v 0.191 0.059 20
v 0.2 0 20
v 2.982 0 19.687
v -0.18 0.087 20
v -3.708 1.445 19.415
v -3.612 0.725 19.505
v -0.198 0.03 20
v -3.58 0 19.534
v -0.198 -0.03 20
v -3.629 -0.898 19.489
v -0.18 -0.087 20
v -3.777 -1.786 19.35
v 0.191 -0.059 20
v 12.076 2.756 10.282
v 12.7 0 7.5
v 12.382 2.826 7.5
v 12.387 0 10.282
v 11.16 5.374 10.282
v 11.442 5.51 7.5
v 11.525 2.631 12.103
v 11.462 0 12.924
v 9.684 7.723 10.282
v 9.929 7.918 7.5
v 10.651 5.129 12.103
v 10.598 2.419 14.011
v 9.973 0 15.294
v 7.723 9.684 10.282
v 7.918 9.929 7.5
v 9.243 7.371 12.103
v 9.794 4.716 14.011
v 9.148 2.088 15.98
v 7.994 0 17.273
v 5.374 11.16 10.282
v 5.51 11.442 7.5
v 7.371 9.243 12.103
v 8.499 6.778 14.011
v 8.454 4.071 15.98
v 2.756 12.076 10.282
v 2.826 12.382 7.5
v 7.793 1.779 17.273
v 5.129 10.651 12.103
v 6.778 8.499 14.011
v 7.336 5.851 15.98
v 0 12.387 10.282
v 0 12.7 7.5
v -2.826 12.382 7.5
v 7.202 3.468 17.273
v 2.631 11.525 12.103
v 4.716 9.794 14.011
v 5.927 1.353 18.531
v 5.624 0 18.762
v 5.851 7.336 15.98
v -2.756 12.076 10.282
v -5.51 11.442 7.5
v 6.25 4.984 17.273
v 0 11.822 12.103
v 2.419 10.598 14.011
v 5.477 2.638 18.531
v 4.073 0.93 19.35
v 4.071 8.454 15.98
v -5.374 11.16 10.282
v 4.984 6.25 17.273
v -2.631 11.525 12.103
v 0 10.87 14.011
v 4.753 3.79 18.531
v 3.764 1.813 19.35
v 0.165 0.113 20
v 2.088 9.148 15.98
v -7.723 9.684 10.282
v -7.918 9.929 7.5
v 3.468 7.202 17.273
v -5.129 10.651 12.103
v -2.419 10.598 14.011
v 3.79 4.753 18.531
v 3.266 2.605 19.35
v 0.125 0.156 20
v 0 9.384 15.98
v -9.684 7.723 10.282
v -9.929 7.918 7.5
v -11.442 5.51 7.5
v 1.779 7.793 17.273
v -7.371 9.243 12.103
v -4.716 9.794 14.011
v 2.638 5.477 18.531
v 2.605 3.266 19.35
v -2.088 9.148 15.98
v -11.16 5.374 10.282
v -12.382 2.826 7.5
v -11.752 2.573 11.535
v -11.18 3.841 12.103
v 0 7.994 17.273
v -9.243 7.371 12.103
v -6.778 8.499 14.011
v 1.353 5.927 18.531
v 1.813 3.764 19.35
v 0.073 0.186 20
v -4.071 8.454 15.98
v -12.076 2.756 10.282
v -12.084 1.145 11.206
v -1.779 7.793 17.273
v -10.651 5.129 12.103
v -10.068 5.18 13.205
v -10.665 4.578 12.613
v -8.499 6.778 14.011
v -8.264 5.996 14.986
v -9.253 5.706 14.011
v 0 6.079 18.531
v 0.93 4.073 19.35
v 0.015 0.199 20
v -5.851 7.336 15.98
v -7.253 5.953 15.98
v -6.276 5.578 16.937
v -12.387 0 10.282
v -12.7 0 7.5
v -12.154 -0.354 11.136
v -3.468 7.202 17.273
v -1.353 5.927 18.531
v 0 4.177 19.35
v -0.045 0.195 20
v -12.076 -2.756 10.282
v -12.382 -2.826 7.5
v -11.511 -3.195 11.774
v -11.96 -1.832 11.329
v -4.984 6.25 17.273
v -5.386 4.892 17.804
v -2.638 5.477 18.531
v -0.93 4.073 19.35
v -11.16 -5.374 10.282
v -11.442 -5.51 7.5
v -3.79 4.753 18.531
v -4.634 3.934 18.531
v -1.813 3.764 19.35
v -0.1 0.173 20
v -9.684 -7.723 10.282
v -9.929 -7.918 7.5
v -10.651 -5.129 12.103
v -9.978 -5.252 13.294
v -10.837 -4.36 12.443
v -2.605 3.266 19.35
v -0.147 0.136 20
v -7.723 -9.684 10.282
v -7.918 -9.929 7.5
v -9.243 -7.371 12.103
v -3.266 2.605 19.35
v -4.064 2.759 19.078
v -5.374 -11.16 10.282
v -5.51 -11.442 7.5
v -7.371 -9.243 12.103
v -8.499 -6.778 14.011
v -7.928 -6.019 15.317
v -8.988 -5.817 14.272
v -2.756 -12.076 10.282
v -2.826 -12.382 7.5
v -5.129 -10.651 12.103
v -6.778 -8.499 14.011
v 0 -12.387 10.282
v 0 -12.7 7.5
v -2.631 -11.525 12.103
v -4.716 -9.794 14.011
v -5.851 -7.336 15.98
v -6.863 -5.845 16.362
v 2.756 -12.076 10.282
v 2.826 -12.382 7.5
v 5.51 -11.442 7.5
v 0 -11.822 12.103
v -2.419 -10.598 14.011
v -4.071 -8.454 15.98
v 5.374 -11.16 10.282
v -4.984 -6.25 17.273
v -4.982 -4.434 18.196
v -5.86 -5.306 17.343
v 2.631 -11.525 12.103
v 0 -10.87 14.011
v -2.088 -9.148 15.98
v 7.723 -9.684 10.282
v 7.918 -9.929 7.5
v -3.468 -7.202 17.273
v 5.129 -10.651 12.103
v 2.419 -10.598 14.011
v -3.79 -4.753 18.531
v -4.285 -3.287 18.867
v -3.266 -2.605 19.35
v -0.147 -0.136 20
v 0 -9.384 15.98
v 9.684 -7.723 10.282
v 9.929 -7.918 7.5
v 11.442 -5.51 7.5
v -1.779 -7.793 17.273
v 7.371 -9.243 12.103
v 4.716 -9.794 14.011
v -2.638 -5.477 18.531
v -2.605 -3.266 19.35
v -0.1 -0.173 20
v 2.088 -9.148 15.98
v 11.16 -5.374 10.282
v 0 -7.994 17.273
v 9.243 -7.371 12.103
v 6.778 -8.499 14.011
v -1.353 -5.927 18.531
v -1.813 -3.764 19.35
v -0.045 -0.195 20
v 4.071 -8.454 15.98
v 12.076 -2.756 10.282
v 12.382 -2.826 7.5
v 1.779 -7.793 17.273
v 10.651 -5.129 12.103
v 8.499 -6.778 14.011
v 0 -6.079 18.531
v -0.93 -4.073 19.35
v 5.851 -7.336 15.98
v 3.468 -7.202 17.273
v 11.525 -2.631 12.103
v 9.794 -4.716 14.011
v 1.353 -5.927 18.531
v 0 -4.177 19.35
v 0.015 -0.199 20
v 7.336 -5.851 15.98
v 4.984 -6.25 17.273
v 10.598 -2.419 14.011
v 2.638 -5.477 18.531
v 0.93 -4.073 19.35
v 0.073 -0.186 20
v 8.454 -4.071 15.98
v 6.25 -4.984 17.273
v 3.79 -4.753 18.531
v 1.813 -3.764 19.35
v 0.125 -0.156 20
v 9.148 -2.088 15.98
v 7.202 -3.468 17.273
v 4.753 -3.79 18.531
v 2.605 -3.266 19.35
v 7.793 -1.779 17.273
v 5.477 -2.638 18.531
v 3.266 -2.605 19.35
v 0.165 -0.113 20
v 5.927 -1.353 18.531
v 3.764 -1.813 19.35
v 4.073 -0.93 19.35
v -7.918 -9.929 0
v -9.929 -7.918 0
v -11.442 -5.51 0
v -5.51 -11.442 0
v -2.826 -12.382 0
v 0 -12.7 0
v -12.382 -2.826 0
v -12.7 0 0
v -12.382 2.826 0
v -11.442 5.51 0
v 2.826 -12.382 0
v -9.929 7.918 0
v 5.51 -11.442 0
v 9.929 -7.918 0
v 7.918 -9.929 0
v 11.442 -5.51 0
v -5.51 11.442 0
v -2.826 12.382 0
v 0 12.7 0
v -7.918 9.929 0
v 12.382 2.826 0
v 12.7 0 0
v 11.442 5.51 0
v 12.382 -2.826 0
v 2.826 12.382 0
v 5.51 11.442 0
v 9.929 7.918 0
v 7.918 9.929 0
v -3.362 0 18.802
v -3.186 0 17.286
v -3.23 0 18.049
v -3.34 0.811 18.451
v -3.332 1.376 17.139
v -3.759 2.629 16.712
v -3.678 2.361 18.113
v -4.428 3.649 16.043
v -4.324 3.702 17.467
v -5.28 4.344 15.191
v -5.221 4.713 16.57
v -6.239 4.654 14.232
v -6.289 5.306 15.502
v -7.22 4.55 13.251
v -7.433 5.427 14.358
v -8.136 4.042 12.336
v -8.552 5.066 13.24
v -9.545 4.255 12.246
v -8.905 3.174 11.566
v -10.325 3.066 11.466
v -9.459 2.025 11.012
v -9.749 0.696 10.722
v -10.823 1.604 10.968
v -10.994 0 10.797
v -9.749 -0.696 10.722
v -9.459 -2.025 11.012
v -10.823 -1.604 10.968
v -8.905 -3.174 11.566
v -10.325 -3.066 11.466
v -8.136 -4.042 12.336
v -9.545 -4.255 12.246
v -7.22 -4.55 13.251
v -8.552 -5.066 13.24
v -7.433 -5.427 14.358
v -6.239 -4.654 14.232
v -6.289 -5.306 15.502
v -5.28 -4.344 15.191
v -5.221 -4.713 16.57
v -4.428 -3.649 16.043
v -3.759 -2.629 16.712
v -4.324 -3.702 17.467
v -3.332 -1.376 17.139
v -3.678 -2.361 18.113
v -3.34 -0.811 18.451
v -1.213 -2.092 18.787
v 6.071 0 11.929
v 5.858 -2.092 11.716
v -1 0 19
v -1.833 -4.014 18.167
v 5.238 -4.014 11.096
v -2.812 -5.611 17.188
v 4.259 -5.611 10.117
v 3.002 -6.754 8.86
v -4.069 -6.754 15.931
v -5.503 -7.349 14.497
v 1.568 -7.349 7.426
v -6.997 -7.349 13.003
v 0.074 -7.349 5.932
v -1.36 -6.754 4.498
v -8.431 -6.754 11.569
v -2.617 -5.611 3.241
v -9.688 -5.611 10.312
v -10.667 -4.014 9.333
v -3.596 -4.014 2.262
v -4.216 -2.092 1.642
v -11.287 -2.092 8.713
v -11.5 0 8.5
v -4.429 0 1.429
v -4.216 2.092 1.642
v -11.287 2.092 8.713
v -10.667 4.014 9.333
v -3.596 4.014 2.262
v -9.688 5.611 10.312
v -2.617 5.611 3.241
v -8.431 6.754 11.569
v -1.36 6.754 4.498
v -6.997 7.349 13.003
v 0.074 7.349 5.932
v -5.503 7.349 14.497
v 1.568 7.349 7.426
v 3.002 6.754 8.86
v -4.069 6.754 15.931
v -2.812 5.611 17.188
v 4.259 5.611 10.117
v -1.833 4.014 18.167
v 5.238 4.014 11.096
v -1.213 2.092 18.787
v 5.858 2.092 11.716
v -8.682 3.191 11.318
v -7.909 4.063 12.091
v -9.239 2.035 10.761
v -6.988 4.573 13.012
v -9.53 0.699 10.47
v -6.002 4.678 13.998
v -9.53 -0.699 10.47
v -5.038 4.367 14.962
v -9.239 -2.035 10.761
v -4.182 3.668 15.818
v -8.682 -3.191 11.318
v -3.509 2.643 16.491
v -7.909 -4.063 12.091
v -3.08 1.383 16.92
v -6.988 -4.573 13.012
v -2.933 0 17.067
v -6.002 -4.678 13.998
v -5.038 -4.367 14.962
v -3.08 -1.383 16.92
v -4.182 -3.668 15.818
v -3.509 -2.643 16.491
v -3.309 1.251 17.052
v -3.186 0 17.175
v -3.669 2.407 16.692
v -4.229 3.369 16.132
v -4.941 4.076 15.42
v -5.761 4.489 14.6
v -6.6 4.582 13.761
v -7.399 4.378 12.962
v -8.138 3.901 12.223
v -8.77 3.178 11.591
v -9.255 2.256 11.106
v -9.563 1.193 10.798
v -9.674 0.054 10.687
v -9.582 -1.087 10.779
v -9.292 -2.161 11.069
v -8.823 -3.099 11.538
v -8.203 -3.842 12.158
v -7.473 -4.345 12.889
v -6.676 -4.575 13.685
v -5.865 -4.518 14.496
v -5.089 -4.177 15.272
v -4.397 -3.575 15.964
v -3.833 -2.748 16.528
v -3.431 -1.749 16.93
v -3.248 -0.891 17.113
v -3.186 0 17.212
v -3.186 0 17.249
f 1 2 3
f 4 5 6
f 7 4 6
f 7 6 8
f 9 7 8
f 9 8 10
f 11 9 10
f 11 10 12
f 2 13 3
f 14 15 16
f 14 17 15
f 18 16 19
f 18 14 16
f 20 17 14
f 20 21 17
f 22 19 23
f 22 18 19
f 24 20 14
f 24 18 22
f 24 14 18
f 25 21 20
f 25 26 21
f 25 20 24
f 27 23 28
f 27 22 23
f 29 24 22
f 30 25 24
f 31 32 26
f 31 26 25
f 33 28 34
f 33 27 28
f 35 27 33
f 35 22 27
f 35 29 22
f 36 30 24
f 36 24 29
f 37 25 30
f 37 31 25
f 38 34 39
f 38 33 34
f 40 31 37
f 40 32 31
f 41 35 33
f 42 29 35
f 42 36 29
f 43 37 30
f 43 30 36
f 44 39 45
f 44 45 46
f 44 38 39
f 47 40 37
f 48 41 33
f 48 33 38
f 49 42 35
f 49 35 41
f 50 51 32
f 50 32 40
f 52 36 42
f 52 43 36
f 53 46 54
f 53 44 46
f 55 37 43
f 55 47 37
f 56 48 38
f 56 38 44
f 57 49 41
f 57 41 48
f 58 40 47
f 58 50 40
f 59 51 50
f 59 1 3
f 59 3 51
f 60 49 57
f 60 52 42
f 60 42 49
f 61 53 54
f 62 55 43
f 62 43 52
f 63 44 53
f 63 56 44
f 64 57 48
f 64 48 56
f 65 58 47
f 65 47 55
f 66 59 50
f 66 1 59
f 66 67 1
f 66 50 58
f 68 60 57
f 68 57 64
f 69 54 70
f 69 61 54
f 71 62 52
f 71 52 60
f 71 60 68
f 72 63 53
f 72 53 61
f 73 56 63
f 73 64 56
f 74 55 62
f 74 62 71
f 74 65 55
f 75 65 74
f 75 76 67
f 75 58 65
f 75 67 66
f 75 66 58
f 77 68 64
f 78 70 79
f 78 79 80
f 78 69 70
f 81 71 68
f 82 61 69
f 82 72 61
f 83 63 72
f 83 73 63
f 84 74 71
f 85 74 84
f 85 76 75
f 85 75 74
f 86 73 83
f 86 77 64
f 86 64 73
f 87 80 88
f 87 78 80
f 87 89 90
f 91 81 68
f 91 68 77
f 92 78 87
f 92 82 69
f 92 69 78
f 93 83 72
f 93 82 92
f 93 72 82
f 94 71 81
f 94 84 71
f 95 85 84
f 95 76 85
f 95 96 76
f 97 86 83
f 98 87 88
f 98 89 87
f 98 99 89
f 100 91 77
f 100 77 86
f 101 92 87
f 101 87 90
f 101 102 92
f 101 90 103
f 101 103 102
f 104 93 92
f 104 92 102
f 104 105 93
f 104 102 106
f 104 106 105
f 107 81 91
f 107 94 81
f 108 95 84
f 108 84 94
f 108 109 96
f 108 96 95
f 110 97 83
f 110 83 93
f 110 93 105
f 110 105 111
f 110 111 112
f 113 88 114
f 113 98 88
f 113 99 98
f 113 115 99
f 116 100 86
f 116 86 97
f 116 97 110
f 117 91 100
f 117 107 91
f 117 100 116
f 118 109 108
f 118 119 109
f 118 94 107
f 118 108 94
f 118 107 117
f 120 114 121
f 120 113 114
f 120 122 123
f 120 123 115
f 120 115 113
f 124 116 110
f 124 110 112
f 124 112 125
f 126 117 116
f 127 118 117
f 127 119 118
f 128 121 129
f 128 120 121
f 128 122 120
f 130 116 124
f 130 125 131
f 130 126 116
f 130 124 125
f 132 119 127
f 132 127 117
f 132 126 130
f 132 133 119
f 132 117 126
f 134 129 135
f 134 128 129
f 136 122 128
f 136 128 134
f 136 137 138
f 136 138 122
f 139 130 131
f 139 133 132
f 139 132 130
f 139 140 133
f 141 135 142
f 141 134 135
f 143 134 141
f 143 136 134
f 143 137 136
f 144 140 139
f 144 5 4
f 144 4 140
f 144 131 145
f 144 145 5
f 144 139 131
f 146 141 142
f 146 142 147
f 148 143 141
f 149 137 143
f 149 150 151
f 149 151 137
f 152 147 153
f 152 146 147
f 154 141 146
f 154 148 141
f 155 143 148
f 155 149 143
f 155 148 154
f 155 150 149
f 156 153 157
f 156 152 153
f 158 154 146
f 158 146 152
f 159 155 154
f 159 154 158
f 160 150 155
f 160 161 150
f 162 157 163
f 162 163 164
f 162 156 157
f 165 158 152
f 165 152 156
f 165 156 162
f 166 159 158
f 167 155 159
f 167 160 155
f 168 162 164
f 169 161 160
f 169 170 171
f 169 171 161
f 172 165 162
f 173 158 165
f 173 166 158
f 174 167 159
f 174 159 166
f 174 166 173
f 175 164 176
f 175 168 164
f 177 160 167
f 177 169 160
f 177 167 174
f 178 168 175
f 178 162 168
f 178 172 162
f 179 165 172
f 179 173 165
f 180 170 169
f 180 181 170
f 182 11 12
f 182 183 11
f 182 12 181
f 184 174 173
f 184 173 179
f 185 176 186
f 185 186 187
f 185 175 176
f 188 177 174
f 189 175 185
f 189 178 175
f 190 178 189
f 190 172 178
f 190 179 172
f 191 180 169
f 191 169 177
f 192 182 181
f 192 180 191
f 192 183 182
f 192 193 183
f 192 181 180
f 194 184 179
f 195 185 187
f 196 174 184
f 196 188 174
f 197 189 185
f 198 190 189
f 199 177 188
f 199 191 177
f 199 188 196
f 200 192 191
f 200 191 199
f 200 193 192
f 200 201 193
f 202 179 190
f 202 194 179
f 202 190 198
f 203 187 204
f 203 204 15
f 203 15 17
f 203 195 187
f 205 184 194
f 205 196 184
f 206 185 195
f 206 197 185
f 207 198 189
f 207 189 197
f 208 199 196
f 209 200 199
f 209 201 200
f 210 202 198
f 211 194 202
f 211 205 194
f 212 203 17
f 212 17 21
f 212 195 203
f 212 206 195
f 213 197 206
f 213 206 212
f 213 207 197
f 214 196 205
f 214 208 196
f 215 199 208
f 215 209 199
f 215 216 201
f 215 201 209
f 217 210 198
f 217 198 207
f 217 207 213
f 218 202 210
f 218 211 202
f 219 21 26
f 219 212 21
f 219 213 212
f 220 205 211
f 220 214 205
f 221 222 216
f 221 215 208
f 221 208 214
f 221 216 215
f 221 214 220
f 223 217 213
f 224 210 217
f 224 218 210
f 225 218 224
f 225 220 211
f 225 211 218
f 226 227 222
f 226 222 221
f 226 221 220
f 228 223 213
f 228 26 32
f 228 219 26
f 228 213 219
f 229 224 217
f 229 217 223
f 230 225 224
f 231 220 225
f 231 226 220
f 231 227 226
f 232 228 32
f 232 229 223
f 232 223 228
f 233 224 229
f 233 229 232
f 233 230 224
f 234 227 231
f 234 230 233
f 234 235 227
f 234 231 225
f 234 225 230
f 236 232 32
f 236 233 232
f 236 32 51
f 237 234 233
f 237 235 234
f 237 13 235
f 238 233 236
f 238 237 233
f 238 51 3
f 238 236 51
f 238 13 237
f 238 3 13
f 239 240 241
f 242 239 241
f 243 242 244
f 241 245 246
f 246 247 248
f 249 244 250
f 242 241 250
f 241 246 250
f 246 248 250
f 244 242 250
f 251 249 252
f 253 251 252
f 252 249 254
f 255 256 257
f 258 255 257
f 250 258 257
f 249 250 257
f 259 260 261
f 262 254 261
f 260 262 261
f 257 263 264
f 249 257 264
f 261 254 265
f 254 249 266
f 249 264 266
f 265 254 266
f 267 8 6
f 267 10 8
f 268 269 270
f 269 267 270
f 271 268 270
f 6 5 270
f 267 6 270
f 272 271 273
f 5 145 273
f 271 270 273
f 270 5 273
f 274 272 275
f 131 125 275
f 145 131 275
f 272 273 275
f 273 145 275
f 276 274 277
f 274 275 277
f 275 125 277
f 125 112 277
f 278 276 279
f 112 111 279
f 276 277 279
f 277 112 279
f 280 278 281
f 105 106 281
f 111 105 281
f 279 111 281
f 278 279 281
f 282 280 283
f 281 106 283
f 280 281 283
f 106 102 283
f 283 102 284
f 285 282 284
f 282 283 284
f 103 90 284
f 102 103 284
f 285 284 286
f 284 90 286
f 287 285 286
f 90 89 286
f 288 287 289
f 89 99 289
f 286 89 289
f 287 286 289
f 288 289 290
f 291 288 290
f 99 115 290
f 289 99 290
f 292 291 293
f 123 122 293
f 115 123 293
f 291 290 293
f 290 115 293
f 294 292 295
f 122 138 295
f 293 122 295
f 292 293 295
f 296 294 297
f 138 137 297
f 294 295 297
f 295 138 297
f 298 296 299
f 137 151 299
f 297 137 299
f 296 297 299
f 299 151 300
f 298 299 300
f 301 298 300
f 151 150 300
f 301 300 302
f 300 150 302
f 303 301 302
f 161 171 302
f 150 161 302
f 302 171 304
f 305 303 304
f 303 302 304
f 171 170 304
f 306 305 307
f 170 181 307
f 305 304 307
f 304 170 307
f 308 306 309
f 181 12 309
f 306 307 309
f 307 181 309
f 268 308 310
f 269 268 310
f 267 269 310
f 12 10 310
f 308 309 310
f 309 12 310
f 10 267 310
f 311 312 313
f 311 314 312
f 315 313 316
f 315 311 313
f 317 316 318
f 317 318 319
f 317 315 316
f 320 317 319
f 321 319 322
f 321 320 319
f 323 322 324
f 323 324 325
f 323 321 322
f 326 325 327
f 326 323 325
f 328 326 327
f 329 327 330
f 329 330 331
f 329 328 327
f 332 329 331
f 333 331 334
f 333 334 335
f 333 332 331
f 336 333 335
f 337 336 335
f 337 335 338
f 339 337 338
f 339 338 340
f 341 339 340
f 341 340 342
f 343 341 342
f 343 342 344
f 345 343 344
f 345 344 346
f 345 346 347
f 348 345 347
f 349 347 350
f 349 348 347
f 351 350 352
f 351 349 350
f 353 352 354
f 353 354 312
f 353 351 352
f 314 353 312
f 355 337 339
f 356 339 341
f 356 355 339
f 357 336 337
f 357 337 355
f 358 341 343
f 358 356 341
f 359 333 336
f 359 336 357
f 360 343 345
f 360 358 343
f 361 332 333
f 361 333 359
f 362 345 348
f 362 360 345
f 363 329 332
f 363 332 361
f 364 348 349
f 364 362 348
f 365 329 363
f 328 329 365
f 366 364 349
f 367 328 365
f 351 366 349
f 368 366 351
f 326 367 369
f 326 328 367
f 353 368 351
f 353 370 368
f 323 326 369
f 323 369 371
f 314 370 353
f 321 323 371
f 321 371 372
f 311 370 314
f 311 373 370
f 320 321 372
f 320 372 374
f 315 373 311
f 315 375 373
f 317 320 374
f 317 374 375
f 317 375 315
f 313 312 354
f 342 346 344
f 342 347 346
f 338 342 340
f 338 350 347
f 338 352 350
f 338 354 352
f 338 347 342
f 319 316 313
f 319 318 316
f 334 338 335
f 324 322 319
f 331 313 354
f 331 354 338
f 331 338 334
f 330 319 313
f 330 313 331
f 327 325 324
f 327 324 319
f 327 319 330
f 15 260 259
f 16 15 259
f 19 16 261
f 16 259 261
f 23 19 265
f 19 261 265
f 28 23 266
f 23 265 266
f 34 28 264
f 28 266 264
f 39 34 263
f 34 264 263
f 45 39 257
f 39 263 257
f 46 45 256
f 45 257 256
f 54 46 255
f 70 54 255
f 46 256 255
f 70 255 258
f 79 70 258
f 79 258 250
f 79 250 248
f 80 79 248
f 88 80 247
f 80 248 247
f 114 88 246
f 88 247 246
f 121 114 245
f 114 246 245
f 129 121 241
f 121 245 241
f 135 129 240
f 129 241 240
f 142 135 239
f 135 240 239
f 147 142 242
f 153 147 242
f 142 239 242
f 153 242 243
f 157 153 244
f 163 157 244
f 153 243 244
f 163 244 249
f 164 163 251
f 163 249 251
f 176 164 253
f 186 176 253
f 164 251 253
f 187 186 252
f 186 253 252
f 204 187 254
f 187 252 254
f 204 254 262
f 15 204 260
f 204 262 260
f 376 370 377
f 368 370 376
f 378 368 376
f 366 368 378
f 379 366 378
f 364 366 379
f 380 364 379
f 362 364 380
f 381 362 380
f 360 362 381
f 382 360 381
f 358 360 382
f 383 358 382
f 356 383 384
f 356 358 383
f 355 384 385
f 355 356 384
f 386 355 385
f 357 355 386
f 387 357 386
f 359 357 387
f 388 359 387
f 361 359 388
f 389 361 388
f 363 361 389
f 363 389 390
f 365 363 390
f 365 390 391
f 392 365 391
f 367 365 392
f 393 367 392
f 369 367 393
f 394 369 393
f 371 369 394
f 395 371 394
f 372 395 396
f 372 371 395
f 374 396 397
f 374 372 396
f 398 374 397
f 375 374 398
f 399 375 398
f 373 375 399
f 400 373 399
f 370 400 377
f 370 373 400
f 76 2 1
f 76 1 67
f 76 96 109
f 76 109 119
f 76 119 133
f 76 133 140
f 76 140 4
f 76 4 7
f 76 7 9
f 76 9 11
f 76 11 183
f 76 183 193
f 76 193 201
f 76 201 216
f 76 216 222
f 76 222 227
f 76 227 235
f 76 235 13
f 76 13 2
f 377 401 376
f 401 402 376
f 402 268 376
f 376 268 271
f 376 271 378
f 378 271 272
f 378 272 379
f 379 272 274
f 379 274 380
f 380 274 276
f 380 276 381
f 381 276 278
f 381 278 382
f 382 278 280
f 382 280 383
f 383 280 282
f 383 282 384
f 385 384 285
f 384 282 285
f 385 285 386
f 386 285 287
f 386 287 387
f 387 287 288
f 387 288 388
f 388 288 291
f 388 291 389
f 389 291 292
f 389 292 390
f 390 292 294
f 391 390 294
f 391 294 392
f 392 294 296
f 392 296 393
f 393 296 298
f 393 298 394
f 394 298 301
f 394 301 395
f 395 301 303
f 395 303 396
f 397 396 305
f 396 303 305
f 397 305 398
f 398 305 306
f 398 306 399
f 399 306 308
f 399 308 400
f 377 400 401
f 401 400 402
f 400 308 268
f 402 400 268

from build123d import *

# Parameters (mm, degrees)
F0_R     = 12.7
F1_DEPTH = 20
F2_R     = 12.5


# Not quite as in the source:
# - a fillet or chamfer that OpenCascade refuses, or shapes differently, is made with other operations: its cross-section is extruded or revolved along the edge and cut away or added


with BuildPart() as f1:
    # F0 (on Top) → F1 (new body)
    with BuildSketch(Plane.XY):
        Circle(F0_R)
    extrude(amount=F1_DEPTH)

    # F2
    f2_edges = [f1.edges().sort_by_distance(p)[0] for p in [
        (-12.7, 0, 20),
    ]]
    fillet(f2_edges, radius=F2_R)

    # F3 (on Front) → F4 (revolve, cut)
    with BuildSketch(Plane.XZ):
        Polygon((6.0710678119, 11.9289321881), (-1, 19), (-6.25, 13.75), (0.8210678119, 6.6789321881), align=None)
    revolve(axis=Axis((-2.7144660941, 0, 10.2144660941), (0.7071067812, 0, -0.7071067812)), mode=Mode.SUBTRACT)

    # F5 (on Front) → F6 (revolve, cut)
    with BuildSketch(Plane.XZ):
        with BuildLine():
            Line((-9.7855339059, 17.2855339059), (-5.1186291501, 12.6186291501))
            ThreePointArc((-5.1186291501, 12.6186291501), (-3.6879289914, 14.7598232523), (-3.1855339059, 17.2855339059))
            ThreePointArc((-3.1855339059, 17.2855339059), (-7.2598232523, 23.3831388205), (-14.4524386618, 21.9524386618))
            Line((-14.4524386618, 21.9524386618), (-9.7855339059, 17.2855339059))
        make_face()
    revolve(axis=Axis((-12.1189862838, 0, 19.6189862838), (-0.7071067812, 0, 0.7071067812)), mode=Mode.SUBTRACT)

    # F7: chamfer of 0.4 on 1 edges, made by hand

    # F7_s1 → F7_t2 (revolve, cut)
    with BuildSketch(Plane.XZ):
        with BuildLine():
            Line((-3.2011954465, 17.1809028584), (-2.9181547597, 17.0608682325))
            Line((-2.9181547597, 17.0608682325), (-2.9124979054, 17.0552113782))
            ThreePointArc((-2.9124979054, 17.0552113782), (-3.0605101564, 16.9281761351), (-3.1980339034, 16.7906523881))
            Line((-3.1980339034, 16.7906523881), (-3.2116687493, 16.7969022419))
            ThreePointArc((-3.2116687493, 16.7969022419), (-3.2002291645, 16.9885061916), (-3.2091943175, 17.1810372559))
            Line((-3.2091943175, 17.1810372559), (-3.2011954465, 17.1809028584))
        make_face()
    revolve(axis=Axis((-6.25, 0, 13.75), (-0.7071067812, 0, 0.7071067812)), mode=Mode.SUBTRACT)


solid = f1.part
